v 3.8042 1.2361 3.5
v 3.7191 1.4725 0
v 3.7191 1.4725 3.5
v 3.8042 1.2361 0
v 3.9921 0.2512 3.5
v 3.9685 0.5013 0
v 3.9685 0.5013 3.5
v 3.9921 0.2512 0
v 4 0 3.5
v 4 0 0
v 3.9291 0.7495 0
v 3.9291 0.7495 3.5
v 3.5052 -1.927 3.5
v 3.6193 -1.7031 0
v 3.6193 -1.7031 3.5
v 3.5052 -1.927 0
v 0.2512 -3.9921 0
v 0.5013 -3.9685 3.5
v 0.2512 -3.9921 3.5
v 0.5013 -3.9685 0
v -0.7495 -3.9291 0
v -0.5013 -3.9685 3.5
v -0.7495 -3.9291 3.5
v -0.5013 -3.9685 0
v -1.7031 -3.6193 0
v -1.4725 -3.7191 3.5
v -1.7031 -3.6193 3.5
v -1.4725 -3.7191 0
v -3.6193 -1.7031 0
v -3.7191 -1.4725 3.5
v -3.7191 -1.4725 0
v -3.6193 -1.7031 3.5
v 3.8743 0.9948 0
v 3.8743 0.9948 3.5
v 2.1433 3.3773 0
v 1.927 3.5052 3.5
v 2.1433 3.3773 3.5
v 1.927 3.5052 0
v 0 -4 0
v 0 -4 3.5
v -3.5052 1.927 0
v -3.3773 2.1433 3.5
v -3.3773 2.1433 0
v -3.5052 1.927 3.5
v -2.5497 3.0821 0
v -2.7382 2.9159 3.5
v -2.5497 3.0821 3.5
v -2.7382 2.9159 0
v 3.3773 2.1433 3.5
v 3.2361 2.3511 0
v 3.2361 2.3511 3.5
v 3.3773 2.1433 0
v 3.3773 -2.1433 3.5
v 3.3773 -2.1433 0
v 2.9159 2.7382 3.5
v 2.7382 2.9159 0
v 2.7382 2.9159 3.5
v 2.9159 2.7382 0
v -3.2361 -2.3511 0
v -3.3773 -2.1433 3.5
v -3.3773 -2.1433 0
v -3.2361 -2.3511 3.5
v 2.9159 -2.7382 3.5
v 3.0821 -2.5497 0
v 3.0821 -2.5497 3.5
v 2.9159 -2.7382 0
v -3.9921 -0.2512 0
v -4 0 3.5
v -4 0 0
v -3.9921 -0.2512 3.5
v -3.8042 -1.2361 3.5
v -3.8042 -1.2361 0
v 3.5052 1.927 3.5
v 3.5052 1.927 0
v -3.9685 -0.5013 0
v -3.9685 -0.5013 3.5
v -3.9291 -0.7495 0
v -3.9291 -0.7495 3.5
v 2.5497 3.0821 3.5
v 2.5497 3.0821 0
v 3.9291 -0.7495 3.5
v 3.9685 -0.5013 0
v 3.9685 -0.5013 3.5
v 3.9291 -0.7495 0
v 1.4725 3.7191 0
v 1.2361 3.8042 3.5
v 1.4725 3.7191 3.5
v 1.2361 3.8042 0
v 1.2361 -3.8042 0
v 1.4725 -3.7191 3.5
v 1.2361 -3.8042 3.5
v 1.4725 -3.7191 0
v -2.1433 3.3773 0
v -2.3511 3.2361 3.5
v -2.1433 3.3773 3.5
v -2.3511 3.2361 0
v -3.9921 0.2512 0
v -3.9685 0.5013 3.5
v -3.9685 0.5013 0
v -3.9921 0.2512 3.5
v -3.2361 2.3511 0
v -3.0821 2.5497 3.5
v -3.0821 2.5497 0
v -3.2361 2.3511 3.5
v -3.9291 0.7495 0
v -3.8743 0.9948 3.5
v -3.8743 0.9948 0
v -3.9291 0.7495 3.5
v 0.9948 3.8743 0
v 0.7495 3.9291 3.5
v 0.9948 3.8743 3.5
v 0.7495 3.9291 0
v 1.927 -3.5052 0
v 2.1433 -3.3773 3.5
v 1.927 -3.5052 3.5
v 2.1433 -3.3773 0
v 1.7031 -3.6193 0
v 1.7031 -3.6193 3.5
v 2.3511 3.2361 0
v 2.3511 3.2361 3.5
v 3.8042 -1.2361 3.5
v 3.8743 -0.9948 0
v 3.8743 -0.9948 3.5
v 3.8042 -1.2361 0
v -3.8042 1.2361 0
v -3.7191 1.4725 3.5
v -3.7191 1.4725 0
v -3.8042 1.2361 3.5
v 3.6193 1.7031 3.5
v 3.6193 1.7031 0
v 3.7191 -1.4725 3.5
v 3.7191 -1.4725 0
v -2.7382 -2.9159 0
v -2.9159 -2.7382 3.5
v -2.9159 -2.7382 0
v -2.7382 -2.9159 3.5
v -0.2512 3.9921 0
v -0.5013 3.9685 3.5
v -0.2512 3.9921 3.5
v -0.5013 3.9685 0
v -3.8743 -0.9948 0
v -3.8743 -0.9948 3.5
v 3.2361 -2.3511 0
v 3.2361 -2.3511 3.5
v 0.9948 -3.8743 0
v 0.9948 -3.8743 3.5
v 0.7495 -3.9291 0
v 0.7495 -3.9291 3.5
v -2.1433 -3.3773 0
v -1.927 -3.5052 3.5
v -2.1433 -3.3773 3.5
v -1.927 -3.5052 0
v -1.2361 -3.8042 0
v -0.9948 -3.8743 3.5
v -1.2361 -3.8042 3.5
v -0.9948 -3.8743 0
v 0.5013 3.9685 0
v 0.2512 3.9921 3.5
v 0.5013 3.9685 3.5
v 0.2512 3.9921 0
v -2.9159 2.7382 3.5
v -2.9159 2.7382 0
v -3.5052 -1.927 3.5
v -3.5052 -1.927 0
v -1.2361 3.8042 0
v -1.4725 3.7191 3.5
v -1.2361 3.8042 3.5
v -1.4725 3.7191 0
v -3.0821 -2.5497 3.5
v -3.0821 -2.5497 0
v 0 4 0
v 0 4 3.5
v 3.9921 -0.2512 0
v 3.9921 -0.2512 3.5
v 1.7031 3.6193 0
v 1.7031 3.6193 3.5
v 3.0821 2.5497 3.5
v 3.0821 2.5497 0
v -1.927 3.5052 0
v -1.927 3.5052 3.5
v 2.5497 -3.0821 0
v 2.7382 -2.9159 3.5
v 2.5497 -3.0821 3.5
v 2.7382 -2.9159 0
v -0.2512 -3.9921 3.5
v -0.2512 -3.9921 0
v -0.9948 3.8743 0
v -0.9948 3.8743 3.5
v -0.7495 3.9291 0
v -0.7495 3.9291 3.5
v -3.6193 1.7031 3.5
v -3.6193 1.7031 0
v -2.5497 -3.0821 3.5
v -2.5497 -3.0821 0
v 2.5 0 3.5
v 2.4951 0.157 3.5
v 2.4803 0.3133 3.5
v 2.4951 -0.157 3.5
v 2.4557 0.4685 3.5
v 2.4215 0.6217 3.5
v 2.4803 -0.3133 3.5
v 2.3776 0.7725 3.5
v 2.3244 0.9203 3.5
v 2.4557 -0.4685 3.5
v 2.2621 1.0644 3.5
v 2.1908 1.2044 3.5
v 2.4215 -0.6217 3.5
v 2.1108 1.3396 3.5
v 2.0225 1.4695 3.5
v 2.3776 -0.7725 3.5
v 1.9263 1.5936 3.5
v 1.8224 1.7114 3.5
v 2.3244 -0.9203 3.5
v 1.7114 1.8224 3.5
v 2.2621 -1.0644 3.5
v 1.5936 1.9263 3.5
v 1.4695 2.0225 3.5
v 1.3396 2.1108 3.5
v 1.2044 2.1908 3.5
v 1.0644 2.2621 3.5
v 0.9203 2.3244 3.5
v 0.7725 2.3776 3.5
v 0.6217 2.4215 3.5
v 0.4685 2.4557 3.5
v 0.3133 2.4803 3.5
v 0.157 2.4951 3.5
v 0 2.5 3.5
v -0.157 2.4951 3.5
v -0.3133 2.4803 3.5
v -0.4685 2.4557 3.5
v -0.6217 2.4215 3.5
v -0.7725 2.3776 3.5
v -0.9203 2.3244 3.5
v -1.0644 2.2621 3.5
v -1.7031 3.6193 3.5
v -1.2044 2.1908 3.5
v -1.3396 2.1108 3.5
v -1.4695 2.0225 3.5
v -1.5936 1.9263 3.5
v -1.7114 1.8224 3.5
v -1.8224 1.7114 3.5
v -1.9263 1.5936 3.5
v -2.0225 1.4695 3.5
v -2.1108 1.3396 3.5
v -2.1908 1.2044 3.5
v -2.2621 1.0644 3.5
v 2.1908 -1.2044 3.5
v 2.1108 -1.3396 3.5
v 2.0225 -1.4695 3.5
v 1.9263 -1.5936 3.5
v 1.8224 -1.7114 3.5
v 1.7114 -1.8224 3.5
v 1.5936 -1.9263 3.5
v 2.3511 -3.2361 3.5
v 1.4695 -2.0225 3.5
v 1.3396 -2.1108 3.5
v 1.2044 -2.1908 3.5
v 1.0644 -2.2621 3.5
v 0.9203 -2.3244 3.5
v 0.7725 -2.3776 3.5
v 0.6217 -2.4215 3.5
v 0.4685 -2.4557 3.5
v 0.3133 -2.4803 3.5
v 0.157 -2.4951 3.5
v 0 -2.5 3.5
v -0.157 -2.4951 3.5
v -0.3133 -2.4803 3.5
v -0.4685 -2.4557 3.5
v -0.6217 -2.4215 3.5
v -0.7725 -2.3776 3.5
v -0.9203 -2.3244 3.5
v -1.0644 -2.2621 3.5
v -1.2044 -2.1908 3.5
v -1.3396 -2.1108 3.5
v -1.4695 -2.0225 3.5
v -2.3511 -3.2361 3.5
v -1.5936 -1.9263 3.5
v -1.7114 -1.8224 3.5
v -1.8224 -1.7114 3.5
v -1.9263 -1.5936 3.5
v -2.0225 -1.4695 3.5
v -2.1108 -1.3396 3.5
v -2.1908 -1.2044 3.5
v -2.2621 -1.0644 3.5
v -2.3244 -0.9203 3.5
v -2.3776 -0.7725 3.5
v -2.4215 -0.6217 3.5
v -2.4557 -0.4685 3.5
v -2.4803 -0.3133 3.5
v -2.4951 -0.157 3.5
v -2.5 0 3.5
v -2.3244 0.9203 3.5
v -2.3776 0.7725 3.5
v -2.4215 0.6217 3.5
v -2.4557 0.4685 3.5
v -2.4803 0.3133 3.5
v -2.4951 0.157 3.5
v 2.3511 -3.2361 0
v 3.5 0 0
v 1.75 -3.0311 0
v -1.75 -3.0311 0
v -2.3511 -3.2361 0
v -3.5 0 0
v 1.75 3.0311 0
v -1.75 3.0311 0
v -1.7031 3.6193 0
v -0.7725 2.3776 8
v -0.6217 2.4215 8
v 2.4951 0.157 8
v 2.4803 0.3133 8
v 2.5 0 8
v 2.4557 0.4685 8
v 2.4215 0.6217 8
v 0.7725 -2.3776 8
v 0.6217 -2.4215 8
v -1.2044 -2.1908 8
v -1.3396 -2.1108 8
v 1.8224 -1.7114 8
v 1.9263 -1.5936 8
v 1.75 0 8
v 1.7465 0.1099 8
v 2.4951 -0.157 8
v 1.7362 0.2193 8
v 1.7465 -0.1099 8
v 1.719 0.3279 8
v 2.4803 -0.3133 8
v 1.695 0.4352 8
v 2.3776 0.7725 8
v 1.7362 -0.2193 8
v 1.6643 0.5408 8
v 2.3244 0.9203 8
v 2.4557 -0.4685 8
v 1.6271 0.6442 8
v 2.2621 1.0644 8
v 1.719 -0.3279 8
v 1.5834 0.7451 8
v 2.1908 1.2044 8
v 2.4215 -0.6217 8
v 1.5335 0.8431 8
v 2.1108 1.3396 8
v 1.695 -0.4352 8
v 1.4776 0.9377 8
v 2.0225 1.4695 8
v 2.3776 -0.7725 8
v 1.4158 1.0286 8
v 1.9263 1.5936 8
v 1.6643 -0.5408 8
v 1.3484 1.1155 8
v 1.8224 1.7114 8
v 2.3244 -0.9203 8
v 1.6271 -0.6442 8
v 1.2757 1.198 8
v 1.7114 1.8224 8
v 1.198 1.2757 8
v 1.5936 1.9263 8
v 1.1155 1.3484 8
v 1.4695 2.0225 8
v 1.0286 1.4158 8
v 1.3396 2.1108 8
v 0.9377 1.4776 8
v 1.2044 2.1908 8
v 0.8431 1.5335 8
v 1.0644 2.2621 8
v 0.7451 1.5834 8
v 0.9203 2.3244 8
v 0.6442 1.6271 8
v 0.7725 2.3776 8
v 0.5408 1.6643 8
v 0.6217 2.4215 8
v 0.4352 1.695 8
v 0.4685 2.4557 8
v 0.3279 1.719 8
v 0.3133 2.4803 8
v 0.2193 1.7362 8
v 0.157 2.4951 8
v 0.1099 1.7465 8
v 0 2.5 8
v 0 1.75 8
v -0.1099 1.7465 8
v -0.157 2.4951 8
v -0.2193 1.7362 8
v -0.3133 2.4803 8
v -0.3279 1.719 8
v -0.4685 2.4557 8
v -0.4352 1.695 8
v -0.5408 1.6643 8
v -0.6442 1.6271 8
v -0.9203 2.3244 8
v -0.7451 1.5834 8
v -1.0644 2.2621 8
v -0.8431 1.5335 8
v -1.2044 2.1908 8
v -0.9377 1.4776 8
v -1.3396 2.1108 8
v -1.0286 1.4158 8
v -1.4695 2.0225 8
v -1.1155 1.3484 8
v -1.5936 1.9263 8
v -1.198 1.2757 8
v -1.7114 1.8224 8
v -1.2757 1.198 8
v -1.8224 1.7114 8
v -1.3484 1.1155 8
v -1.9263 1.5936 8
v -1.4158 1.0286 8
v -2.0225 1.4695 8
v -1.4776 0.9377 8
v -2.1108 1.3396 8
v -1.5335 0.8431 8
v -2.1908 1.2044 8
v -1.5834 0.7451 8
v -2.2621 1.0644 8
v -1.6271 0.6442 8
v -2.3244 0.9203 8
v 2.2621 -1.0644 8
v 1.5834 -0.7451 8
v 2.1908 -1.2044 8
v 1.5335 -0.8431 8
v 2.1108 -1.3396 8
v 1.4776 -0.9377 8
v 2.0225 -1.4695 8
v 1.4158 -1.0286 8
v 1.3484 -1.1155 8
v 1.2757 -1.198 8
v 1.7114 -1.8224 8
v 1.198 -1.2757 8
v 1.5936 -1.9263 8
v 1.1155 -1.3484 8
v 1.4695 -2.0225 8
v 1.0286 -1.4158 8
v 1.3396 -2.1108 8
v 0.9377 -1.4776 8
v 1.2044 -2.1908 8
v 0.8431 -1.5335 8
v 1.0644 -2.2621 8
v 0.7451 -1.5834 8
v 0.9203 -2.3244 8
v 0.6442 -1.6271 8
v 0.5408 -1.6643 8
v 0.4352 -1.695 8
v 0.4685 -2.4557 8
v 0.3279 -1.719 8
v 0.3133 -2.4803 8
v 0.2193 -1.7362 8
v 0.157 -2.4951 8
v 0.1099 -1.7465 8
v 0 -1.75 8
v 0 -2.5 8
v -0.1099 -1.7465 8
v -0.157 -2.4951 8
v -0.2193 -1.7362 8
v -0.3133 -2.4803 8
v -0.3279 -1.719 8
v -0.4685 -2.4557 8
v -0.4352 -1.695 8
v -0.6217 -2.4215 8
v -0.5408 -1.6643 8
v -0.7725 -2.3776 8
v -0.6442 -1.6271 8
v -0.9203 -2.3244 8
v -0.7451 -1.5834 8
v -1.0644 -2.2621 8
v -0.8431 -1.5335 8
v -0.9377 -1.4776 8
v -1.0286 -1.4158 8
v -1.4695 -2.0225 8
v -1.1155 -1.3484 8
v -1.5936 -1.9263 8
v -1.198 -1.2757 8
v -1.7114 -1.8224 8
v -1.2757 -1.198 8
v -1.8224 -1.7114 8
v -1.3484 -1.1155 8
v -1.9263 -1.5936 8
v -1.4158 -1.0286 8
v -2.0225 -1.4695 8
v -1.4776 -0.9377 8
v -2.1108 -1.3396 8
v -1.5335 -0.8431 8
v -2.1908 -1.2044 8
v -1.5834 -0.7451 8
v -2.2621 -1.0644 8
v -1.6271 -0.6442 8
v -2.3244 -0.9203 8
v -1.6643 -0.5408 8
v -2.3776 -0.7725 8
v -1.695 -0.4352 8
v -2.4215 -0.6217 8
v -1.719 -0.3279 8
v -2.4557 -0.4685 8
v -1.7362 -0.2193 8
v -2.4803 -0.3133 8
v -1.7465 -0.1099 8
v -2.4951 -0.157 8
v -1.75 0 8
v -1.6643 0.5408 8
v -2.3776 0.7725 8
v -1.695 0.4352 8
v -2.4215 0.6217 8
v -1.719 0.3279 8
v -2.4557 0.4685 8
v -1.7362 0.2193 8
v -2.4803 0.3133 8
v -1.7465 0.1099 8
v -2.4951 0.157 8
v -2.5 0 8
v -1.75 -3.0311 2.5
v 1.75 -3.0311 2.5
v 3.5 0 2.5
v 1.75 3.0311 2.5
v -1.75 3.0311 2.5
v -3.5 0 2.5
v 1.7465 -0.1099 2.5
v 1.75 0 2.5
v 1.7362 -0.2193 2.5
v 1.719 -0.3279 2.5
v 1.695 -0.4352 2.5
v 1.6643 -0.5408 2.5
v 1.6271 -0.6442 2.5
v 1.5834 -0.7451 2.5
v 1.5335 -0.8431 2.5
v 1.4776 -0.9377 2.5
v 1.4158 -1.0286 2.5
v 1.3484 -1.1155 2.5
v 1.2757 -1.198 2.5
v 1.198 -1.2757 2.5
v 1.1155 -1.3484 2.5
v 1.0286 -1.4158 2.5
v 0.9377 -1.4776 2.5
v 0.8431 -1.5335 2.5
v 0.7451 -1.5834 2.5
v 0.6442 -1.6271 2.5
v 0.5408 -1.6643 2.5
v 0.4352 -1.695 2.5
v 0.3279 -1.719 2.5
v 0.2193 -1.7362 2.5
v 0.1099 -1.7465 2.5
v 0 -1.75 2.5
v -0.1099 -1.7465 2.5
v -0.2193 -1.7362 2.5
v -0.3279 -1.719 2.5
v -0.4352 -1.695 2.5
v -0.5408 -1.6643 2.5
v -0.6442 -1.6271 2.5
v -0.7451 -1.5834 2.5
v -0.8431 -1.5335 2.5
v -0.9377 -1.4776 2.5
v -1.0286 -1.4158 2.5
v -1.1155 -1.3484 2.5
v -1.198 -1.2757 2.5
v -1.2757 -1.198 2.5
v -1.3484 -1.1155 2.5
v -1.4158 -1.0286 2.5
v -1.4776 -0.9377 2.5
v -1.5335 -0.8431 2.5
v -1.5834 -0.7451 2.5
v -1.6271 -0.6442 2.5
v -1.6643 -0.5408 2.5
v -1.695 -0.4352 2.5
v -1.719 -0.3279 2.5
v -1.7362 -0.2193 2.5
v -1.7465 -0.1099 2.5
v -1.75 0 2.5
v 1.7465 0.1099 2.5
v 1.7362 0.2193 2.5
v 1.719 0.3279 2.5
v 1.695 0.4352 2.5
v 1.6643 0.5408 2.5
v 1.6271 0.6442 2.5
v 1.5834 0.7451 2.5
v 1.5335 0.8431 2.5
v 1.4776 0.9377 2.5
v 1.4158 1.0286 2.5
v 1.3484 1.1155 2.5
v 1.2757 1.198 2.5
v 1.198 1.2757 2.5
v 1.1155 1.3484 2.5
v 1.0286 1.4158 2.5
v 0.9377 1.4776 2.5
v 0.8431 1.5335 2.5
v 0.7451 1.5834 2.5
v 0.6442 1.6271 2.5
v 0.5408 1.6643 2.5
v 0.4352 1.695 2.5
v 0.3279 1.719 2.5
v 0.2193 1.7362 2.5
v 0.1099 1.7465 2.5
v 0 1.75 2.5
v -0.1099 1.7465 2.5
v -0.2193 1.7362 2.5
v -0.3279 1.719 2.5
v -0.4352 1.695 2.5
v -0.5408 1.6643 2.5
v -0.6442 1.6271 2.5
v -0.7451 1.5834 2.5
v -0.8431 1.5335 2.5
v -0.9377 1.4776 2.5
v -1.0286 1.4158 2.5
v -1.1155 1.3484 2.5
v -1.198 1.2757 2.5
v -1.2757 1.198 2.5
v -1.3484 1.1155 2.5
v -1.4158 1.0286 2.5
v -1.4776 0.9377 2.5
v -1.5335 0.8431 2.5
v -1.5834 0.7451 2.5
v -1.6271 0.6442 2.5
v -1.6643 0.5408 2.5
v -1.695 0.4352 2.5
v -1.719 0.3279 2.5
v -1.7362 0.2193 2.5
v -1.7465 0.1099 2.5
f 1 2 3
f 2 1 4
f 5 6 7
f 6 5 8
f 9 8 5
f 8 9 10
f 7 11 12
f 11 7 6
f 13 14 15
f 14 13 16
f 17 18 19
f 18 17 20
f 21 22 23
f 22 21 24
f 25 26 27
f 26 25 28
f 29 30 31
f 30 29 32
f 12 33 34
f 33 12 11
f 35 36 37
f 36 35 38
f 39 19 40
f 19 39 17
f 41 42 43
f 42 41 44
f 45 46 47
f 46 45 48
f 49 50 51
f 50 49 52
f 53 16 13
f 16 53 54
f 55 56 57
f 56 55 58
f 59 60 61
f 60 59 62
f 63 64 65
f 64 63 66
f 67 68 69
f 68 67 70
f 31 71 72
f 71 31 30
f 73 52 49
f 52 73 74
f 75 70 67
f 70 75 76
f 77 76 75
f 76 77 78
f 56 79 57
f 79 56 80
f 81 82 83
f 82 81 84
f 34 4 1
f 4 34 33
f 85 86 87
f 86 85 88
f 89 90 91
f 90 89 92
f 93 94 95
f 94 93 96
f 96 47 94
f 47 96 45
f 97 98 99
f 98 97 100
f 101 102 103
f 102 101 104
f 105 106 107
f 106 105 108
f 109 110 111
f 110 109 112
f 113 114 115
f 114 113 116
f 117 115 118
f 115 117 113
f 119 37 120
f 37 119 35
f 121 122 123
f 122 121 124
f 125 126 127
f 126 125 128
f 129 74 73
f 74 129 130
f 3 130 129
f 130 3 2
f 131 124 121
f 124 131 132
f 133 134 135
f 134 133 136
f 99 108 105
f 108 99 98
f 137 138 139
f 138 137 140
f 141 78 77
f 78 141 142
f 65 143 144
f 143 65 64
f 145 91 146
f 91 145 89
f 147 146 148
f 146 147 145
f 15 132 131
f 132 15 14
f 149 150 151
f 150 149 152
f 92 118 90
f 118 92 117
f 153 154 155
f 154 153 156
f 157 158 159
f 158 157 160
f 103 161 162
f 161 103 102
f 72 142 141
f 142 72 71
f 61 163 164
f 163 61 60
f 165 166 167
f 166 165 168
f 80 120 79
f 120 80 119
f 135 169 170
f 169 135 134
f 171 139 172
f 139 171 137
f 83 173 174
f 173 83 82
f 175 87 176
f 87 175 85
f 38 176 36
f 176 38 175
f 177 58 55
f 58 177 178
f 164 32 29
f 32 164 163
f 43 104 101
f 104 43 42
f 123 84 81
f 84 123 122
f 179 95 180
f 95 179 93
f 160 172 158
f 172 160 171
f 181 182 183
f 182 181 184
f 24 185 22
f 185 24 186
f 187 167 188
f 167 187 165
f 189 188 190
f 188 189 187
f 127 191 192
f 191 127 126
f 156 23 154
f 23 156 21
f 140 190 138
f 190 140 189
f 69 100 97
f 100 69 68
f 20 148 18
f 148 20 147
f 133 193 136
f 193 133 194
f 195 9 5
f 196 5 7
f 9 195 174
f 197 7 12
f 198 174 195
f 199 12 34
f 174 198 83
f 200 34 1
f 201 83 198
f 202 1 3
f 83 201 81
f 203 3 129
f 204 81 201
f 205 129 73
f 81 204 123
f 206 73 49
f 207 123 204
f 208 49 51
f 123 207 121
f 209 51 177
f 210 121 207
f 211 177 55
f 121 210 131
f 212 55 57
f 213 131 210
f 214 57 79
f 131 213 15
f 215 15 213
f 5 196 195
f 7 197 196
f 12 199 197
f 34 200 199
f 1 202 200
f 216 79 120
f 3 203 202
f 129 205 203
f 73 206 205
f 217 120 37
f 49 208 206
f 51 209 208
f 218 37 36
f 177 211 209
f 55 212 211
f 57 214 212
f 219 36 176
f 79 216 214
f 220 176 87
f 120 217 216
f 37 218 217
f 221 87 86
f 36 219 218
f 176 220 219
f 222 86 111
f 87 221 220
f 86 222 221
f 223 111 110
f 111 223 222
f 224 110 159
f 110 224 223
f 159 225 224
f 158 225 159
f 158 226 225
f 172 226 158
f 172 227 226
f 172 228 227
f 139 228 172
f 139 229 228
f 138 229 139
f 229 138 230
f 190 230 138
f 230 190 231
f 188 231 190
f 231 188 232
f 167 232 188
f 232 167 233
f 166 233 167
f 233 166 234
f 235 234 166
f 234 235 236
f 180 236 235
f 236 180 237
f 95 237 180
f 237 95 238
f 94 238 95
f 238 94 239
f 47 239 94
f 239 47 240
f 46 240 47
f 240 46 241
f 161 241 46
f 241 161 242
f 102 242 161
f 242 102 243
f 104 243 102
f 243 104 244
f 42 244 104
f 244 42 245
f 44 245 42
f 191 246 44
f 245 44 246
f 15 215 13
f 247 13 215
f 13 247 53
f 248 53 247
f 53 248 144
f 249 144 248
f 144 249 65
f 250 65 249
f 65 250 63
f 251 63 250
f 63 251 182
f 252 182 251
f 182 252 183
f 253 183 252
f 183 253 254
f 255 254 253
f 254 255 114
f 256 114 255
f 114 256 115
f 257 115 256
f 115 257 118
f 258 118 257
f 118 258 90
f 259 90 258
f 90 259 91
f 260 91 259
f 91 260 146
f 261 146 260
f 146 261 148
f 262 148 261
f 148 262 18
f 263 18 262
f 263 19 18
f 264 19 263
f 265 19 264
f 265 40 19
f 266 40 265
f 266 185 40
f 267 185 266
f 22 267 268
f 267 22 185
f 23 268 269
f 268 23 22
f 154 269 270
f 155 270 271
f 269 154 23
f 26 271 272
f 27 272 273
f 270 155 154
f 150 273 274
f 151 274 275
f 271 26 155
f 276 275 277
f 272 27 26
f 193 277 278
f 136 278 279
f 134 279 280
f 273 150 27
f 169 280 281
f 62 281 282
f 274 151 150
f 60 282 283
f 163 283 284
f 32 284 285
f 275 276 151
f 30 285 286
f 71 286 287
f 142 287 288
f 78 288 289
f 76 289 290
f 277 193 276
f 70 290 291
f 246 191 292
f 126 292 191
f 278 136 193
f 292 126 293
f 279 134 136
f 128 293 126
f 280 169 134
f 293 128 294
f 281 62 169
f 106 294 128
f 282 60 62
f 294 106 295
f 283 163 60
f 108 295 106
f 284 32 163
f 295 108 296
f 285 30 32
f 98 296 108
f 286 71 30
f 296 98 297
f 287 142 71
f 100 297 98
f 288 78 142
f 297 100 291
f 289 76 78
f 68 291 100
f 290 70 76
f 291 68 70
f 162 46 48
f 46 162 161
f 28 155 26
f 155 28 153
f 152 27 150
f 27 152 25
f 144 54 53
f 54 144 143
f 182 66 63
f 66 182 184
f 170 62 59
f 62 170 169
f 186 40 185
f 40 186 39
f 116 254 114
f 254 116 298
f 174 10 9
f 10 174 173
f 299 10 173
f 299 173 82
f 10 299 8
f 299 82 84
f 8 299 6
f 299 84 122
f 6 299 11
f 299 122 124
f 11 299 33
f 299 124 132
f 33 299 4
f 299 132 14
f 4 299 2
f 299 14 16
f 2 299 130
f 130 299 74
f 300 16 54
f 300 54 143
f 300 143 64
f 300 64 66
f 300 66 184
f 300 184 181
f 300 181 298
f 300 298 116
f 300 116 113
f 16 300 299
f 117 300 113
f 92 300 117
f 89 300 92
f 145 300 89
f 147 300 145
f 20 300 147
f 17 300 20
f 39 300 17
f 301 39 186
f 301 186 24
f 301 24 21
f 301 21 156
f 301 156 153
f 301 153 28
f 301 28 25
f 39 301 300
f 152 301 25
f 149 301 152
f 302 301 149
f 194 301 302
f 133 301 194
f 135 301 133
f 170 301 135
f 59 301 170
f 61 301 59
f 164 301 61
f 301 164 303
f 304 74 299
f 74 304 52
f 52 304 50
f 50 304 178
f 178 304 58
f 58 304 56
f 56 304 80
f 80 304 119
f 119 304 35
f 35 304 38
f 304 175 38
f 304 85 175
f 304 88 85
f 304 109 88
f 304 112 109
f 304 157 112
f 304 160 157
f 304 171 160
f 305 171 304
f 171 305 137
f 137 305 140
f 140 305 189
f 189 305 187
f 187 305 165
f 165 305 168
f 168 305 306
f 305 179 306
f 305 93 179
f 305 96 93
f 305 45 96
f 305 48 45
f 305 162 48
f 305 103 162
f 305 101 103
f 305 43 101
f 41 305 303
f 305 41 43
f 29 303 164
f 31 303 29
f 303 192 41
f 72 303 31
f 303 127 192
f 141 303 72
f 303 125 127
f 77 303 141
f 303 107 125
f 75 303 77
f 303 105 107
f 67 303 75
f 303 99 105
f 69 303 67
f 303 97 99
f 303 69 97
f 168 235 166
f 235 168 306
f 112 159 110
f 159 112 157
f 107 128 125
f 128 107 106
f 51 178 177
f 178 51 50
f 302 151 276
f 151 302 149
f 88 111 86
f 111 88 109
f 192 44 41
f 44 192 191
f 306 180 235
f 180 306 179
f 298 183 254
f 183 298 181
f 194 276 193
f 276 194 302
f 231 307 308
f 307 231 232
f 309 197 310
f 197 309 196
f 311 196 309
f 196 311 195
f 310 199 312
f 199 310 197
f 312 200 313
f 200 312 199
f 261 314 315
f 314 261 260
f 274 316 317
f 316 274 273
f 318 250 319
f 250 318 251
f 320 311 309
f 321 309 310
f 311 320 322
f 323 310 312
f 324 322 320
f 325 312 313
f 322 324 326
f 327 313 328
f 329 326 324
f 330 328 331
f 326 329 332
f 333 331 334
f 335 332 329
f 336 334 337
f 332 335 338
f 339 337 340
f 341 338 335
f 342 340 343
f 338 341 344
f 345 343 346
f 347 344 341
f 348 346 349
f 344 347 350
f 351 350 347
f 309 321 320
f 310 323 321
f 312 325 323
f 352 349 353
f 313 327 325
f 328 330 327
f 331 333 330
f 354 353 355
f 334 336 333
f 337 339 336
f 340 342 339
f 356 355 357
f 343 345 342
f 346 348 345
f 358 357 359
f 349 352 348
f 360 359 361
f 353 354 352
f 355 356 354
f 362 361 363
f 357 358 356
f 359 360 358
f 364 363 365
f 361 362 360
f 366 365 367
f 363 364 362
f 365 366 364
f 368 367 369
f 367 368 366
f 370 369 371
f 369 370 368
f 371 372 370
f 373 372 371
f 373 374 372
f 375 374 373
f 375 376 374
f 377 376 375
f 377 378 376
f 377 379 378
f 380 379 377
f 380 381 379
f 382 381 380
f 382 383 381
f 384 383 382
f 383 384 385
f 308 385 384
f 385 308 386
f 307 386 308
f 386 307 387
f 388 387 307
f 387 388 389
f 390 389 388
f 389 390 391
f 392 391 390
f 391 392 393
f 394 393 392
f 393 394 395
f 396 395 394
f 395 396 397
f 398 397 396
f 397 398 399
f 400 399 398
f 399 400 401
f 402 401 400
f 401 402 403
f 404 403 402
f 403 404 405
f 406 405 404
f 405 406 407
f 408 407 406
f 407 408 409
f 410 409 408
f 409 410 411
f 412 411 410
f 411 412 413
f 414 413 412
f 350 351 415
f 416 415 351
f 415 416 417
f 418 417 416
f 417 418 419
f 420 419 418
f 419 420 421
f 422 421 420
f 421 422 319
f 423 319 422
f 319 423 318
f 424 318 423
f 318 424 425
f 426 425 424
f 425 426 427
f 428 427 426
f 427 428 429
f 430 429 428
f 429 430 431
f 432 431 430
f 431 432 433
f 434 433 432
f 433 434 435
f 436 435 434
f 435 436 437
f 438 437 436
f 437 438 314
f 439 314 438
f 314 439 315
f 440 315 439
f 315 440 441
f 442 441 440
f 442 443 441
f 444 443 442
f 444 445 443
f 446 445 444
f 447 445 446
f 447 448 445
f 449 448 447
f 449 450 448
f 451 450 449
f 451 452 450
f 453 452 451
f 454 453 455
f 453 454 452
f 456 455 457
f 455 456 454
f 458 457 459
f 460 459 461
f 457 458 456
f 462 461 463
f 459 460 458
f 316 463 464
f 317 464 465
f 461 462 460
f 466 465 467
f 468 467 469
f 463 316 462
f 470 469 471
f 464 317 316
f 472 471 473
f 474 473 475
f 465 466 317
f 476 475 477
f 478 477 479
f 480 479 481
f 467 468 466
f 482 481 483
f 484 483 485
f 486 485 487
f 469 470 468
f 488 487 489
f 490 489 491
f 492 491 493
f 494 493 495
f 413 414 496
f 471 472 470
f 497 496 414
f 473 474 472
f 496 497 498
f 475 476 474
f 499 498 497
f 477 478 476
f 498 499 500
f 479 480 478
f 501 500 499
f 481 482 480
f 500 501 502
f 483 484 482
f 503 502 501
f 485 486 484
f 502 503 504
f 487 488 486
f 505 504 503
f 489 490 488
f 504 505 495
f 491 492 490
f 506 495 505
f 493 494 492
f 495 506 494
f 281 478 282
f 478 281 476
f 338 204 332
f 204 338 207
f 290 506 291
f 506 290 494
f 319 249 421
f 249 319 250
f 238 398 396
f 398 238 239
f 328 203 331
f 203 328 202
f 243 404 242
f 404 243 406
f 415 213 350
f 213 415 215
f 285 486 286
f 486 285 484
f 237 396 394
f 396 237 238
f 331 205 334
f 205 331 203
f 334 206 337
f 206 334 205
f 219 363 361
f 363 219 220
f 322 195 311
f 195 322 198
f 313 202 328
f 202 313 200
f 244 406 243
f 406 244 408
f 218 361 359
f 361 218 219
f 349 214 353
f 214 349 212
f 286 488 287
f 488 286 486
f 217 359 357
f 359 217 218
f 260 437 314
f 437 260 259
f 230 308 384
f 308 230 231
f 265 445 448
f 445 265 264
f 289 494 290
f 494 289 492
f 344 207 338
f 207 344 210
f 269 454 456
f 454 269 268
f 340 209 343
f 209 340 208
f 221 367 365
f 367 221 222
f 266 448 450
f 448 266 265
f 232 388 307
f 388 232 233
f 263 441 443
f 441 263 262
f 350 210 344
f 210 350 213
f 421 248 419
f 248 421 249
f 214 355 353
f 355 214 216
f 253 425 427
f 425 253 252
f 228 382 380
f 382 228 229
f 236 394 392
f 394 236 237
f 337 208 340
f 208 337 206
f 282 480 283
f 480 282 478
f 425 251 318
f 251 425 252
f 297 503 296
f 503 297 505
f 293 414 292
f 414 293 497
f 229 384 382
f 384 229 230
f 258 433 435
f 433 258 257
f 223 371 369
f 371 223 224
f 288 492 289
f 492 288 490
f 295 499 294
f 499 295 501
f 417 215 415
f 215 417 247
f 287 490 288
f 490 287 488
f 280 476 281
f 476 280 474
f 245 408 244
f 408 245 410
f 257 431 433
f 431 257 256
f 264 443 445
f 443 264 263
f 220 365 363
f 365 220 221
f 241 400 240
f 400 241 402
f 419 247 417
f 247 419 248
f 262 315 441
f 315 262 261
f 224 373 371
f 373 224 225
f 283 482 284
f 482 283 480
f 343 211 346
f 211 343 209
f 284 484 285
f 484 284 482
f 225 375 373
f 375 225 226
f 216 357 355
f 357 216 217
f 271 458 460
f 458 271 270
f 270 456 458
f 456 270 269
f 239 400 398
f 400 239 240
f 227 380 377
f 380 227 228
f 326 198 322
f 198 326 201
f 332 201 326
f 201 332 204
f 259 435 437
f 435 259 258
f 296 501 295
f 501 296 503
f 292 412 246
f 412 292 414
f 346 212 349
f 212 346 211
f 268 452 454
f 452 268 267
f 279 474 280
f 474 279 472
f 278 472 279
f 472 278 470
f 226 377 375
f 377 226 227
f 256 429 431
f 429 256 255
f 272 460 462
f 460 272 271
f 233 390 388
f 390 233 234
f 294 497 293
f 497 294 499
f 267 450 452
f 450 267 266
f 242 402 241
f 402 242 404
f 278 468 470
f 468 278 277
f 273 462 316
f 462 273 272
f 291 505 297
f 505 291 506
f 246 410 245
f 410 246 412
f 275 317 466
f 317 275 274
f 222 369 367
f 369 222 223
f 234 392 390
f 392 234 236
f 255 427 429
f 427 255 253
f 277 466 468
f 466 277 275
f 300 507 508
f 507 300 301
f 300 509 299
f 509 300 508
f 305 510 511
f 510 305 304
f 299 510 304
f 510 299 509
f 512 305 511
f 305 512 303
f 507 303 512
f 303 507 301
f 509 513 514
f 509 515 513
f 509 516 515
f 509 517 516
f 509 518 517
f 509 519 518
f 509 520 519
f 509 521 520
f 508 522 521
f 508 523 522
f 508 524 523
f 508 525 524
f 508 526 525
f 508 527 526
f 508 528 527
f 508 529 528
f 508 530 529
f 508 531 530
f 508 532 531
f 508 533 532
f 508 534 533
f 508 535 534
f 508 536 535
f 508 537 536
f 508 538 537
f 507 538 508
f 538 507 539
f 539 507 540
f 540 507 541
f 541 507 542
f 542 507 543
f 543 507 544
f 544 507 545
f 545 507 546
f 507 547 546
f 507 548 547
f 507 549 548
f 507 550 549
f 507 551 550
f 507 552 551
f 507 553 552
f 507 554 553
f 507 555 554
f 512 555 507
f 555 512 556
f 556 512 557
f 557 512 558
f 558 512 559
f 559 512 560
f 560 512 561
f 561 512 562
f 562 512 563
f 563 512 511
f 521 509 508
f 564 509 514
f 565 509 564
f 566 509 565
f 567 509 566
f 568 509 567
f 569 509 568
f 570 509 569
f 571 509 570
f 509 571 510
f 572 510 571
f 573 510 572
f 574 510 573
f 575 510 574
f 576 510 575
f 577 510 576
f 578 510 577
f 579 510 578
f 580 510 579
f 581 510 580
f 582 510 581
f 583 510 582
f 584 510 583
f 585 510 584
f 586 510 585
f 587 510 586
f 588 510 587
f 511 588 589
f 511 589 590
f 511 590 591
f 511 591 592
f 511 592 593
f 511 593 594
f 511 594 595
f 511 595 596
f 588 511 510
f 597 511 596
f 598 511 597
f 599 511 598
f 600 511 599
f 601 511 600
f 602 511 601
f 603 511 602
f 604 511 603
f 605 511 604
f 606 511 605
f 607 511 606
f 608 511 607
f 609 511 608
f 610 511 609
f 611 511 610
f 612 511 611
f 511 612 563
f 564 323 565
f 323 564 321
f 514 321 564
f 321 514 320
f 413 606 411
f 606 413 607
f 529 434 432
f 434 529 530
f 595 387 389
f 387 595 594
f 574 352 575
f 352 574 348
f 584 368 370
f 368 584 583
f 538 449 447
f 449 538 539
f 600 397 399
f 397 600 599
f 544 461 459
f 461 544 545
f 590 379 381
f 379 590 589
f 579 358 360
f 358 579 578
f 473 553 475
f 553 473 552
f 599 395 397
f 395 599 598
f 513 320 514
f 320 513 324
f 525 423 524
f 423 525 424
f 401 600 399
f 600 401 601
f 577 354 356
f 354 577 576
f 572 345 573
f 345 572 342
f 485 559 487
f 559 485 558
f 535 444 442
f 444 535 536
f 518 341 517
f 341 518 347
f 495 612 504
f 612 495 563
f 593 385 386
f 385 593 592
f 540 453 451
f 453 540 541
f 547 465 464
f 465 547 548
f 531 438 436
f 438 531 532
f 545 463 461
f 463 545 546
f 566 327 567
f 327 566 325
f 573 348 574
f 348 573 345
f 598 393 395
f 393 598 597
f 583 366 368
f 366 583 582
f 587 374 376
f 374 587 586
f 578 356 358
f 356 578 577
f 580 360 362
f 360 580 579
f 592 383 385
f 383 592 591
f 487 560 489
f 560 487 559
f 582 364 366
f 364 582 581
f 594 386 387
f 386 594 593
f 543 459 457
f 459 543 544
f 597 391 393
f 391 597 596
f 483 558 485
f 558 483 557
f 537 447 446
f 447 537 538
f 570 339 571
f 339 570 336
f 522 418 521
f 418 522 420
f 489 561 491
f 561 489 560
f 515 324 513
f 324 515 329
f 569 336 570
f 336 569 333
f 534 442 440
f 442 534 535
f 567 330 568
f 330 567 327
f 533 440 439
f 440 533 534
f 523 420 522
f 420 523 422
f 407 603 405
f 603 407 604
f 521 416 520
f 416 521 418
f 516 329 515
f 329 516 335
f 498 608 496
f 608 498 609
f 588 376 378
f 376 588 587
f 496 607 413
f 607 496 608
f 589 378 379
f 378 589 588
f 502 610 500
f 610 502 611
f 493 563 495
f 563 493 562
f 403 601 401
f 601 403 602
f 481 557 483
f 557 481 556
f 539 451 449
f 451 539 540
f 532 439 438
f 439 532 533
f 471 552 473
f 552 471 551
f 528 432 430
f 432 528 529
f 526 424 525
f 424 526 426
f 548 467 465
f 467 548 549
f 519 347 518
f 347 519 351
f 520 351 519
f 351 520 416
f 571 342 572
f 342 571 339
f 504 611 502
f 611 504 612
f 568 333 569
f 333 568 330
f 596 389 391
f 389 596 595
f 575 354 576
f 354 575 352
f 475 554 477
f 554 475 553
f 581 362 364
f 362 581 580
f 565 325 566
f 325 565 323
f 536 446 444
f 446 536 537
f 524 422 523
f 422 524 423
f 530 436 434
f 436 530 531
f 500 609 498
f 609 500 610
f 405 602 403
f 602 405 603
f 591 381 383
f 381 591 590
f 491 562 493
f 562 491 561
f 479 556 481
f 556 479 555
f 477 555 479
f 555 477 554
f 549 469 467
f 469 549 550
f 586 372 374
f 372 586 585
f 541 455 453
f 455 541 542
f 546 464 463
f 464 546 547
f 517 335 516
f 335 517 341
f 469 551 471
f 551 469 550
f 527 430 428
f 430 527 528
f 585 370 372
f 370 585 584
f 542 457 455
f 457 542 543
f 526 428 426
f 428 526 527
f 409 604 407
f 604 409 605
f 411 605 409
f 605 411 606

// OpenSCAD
$fn=100;

difference() {
    union() {

        cylinder(h = 3.5, r = 4);
        translate([0, 0, 3.5]) cylinder(h = 4.5, r = 2.5);
    }
    cylinder(h = 2.5, r =3.5, $fn=6);
    cylinder(h = 9, r = 1.75);
}
